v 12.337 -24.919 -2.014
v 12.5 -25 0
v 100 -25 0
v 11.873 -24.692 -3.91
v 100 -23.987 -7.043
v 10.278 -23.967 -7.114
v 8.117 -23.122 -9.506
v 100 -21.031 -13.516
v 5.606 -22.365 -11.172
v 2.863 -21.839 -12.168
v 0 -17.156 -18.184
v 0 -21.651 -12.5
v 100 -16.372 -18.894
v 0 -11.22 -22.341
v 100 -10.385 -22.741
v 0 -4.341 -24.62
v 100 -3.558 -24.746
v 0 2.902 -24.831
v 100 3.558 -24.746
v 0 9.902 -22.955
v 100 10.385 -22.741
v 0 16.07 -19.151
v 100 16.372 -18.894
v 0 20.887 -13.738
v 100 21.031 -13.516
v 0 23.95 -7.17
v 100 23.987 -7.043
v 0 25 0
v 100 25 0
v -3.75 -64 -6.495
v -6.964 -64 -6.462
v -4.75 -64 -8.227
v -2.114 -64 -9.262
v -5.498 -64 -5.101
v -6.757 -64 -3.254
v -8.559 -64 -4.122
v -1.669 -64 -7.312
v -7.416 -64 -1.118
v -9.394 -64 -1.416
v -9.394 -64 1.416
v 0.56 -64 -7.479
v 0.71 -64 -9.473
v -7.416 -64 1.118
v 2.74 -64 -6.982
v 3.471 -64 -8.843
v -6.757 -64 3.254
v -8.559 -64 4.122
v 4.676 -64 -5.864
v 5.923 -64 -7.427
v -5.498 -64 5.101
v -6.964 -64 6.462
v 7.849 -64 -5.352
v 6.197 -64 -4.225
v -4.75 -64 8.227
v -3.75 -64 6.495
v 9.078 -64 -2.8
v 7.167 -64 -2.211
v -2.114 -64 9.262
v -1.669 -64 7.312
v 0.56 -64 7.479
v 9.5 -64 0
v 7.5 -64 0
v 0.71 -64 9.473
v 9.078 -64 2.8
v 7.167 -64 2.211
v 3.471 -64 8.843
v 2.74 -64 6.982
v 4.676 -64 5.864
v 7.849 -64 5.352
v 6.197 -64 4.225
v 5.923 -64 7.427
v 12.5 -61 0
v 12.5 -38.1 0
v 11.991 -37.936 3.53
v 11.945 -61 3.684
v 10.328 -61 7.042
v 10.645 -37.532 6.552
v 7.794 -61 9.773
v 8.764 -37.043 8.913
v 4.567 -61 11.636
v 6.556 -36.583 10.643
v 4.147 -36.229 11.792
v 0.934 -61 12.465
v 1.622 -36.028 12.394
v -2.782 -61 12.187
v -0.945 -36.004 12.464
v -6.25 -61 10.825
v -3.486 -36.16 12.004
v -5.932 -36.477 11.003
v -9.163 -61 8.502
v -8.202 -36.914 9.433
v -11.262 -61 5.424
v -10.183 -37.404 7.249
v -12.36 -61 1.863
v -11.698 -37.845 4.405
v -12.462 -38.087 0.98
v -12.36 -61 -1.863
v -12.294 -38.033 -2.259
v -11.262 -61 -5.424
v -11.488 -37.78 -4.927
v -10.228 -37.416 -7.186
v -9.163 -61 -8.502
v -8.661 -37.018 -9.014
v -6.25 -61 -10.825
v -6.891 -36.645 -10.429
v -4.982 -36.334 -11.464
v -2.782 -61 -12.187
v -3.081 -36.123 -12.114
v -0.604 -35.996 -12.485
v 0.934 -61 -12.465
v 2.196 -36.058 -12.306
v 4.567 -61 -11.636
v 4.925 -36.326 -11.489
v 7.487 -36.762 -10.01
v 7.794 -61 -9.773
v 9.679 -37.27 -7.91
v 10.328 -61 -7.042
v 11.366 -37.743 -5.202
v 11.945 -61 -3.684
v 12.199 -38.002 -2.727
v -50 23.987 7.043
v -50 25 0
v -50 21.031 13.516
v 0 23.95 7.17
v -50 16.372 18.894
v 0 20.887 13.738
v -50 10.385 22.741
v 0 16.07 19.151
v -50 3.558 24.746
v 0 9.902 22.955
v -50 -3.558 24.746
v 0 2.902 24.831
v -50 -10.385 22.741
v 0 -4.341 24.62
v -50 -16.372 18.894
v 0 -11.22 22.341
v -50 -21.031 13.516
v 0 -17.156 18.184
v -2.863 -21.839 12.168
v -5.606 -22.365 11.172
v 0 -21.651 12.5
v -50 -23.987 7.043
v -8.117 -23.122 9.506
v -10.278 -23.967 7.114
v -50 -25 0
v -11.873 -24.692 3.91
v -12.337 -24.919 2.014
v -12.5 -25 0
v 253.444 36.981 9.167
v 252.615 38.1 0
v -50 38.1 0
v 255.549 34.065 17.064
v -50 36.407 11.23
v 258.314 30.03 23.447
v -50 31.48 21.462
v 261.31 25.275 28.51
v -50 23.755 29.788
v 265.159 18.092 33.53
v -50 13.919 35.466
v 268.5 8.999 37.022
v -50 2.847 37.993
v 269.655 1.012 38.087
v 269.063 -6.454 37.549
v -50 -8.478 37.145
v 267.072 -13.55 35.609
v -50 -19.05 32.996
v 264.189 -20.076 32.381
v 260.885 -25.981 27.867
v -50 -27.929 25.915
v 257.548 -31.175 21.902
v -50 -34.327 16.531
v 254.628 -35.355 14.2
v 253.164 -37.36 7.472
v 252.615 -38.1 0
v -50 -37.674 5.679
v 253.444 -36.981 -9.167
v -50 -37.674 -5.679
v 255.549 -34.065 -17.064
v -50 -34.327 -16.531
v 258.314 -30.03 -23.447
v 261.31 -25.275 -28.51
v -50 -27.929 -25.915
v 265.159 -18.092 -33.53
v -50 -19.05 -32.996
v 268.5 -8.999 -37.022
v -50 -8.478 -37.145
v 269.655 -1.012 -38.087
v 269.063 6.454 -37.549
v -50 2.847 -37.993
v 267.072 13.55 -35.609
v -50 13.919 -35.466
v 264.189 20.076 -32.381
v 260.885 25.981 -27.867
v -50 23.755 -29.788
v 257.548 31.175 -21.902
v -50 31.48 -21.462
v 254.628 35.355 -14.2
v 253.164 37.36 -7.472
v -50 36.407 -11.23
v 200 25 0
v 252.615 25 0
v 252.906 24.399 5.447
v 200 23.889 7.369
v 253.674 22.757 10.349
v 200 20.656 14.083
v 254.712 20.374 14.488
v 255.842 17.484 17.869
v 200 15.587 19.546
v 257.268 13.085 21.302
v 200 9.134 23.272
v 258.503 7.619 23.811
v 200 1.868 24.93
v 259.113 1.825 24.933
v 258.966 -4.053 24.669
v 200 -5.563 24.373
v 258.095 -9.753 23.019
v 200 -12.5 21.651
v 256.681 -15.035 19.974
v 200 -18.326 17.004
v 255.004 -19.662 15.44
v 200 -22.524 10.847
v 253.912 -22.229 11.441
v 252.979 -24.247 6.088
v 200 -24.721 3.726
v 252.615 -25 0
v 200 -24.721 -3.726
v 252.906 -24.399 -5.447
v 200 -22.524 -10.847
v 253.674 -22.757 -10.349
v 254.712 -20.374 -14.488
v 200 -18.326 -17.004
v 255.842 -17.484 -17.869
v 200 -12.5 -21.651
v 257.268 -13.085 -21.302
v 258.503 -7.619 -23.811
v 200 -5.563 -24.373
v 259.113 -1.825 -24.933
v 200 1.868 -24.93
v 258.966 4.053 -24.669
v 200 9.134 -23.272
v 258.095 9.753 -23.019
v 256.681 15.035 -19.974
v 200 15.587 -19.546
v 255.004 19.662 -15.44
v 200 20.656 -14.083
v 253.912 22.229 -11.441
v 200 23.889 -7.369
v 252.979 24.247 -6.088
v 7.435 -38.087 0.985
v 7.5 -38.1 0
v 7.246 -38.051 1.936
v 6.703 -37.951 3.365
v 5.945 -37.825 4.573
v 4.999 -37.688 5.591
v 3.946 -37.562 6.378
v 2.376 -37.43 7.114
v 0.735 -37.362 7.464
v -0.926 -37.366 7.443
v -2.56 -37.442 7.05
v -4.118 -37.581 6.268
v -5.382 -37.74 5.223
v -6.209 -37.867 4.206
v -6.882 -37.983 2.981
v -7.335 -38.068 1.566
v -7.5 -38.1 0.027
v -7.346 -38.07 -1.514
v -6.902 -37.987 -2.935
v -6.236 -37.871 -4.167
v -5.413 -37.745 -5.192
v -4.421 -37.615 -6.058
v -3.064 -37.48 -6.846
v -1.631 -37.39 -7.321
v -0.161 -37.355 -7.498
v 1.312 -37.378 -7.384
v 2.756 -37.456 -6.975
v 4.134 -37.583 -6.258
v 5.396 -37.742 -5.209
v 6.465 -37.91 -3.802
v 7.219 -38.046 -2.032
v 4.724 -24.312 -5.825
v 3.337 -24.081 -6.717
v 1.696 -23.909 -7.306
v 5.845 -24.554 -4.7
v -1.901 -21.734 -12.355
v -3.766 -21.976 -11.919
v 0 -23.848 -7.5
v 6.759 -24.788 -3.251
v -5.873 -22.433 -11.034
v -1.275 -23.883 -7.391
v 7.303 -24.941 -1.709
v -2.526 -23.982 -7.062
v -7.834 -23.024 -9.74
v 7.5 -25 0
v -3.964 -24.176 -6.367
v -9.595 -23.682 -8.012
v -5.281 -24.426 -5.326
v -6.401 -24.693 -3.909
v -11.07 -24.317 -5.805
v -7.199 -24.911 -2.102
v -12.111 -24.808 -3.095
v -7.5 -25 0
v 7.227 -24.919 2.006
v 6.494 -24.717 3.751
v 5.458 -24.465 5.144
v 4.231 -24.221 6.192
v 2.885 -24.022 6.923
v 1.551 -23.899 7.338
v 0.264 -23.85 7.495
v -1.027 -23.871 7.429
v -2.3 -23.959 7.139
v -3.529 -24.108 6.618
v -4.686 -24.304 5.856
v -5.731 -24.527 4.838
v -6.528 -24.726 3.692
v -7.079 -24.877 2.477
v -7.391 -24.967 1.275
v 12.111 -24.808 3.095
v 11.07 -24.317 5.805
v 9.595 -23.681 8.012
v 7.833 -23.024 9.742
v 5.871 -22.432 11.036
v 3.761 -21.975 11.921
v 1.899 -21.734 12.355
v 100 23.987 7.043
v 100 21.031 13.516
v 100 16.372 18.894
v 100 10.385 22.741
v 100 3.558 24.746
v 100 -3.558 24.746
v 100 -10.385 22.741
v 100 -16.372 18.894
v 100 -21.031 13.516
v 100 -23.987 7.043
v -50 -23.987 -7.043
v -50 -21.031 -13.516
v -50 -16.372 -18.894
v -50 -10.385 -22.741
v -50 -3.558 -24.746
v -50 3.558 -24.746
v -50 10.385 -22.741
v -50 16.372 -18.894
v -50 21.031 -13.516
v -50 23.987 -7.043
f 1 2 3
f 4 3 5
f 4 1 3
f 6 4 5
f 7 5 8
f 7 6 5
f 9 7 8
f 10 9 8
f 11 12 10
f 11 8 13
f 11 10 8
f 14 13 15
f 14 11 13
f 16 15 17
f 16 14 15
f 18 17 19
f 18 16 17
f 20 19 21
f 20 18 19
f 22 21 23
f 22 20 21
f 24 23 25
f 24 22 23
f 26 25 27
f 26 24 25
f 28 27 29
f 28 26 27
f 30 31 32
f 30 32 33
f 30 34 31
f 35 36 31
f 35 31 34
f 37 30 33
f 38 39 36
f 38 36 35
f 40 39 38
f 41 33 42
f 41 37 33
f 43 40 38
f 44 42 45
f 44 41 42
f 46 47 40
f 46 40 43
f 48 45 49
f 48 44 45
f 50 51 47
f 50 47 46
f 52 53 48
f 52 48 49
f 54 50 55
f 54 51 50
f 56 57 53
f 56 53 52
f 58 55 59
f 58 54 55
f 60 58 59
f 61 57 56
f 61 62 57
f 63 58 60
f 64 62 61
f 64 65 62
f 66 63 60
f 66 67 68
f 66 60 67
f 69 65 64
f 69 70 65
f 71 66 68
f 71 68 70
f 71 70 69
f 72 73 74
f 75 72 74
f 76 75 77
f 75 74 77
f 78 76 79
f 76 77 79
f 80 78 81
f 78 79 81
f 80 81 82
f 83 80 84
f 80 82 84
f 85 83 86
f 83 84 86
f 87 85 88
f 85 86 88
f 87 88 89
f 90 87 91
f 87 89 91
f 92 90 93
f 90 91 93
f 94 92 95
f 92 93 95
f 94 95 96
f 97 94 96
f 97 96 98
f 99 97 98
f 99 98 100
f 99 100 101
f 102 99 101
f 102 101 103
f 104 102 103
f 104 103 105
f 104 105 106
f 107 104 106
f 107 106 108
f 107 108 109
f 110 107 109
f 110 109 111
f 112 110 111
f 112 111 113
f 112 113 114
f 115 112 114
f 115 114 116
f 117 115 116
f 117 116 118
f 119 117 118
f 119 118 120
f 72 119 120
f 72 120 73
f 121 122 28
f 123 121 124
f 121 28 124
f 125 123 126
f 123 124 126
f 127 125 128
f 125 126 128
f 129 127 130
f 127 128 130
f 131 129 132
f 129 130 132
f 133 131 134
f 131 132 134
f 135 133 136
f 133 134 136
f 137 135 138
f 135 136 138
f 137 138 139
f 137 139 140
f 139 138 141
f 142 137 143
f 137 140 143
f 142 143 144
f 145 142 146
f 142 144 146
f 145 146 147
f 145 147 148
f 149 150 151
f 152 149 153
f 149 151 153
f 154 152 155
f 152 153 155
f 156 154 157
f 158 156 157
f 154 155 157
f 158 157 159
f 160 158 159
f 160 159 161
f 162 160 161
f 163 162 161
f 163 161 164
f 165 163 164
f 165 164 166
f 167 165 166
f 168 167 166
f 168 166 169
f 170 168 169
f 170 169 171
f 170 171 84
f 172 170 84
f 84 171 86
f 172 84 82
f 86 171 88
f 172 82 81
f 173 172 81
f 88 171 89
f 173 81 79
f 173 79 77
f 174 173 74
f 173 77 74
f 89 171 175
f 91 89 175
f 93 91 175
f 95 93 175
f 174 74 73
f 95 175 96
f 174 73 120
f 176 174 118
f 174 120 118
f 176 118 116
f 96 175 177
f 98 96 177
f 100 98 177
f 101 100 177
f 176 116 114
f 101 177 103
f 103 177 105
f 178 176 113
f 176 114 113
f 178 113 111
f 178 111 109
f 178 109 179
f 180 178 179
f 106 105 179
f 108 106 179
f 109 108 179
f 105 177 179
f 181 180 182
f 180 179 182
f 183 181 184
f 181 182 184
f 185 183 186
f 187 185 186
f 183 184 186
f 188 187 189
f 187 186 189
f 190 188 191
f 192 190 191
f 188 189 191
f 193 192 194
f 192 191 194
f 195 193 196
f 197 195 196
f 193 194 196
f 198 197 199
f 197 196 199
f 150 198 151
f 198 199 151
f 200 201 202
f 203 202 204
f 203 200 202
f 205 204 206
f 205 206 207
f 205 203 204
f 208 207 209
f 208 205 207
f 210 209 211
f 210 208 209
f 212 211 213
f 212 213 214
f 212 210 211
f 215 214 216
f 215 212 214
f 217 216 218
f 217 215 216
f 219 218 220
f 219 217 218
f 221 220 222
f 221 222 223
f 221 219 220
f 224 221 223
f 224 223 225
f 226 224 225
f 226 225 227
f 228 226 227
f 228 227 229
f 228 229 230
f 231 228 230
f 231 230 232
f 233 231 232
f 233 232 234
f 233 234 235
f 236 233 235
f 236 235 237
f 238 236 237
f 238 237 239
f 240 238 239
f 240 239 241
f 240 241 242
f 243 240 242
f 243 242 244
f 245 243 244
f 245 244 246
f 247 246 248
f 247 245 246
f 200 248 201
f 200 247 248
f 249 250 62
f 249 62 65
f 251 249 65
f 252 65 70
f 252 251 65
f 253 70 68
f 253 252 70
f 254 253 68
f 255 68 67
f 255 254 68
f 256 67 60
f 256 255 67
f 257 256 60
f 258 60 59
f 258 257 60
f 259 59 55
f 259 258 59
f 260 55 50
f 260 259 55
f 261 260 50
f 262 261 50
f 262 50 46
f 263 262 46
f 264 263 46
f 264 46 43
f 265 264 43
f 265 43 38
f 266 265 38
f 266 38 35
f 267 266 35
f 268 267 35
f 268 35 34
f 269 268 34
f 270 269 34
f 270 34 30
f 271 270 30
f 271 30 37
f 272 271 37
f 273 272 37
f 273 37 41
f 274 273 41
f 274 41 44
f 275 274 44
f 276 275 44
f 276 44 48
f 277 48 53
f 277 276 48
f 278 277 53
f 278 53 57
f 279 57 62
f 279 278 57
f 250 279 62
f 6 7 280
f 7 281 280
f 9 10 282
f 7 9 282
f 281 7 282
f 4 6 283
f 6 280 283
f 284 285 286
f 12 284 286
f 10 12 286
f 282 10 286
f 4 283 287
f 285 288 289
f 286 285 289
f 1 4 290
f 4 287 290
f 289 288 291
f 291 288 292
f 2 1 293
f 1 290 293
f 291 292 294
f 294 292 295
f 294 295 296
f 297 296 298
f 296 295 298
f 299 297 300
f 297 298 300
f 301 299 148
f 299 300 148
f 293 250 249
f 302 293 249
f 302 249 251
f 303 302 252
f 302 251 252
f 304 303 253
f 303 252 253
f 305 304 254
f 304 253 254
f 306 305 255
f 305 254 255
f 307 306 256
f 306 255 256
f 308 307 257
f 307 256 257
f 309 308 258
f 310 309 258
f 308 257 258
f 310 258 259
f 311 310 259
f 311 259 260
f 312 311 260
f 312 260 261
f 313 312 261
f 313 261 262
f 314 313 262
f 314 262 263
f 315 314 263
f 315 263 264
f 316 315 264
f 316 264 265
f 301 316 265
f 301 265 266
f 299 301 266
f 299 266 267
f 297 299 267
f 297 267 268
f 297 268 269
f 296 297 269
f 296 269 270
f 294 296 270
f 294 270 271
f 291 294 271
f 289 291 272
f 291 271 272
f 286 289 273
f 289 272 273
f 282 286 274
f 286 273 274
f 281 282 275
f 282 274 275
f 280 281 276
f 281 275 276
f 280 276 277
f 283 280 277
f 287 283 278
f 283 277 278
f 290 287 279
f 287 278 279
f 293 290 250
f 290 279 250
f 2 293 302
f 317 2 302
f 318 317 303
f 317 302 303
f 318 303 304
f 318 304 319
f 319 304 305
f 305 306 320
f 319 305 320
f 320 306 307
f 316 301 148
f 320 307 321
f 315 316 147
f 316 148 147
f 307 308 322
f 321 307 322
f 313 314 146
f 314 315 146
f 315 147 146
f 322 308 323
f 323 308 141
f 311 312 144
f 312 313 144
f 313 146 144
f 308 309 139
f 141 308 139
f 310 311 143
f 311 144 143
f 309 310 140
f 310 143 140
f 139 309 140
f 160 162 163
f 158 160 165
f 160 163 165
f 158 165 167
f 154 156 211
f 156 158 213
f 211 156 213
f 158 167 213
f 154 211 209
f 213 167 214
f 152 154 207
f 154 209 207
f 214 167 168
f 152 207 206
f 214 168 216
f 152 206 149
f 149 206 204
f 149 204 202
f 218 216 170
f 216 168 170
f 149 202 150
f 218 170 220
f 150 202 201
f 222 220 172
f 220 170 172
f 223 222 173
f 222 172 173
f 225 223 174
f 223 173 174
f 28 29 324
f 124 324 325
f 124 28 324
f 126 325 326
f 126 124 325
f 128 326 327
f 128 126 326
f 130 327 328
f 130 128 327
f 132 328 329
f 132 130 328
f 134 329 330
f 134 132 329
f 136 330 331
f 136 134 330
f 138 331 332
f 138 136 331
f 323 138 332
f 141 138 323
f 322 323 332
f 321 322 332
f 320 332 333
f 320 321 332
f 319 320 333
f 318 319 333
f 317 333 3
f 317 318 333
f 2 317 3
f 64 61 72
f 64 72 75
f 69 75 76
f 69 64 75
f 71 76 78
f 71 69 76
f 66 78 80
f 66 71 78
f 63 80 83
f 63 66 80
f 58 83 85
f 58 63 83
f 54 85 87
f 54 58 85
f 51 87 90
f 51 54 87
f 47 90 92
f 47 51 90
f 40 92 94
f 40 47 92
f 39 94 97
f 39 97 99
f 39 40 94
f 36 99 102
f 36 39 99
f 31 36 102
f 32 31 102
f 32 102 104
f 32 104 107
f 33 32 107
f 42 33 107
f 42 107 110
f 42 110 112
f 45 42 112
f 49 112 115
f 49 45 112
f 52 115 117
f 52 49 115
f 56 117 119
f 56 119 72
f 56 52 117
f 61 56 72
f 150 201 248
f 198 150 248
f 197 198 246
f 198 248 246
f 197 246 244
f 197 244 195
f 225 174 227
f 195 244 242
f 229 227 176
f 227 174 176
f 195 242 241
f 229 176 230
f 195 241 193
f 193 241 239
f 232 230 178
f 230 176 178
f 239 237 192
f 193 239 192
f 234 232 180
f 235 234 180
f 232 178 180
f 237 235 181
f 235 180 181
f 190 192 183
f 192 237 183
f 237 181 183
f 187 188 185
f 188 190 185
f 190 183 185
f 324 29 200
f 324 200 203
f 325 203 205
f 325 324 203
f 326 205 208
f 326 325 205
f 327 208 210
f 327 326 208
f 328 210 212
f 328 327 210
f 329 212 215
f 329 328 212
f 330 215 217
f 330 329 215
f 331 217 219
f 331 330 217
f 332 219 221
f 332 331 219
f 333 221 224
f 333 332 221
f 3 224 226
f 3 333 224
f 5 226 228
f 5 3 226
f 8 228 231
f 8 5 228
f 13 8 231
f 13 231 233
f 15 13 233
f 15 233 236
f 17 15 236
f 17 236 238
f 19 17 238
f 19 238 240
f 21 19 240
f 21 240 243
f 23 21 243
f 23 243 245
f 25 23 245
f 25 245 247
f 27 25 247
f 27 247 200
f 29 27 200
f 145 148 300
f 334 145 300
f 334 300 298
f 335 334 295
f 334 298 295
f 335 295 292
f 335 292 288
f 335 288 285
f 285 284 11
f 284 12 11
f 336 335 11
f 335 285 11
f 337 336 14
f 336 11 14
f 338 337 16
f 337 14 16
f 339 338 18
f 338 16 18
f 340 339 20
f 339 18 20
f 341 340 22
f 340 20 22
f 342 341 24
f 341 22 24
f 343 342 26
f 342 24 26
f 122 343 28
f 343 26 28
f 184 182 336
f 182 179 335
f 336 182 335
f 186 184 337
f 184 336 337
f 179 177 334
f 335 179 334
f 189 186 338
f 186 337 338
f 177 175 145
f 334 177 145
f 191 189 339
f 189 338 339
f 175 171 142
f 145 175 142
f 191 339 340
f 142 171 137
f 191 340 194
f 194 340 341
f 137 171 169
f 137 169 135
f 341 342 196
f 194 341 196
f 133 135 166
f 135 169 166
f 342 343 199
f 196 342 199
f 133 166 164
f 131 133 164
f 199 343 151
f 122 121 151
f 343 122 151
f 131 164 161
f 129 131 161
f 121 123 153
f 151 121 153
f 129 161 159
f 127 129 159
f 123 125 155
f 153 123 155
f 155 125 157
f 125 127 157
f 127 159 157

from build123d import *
from build123d import SkipClean  # not in build123d's __all__

# Parameters (mm, degrees)
F0_R      = 12.5
F0_R_2    = 7.5
F1_DEPTH  = 64
F2_R      = 38.1
F2_R_2    = 25
F3_DEPTH  = 100
F4_DEPTH  = 50
F5_SIZE   = 3
F6_R      = 25
F7_DEPTH  = 200
F8_R      = 7.5
F9_DEPTH  = 50
F10_DEPTH = 100
F11_R     = 7.5
F12_DEPTH = 50
F13_DEPTH = 75


with BuildPart() as f1:
    # F0 (on Front) → F1 (new body)
    with BuildSketch(Plane.XZ):
        Circle(F0_R)
        Circle(F0_R_2, mode=Mode.SUBTRACT)
    extrude(amount=F1_DEPTH)

    # F2 (on Right) → F3 (join)
    with BuildSketch(Plane.YZ):
        Circle(F2_R)
        Circle(F2_R_2, mode=Mode.SUBTRACT)
    extrude(amount=F3_DEPTH)

    # F2 (on Right) → F4 (join)
    with BuildSketch(Plane.YZ):
        Circle(F2_R)
        Circle(F2_R_2, mode=Mode.SUBTRACT)
    extrude(amount=-F4_DEPTH)

    # F5
    f5_edges = [f1.edges().sort_by_distance(p)[0] for p in [
        (-12.5, -64, 0),
    ]]
    chamfer(f5_edges, length=F5_SIZE)

    # F6 (on face) → F7 (cut)
    with BuildSketch(Plane(origin=(-50, 0, 0), x_dir=(0, -1, 0), z_dir=(-1, 0, 0))):
        Circle(F6_R)
    extrude(amount=-F7_DEPTH, mode=Mode.SUBTRACT)

    # F8 (on face) → F9 (cut)
    with BuildSketch(Plane.XZ.offset(64)):
        Circle(F8_R)
    extrude(amount=-F9_DEPTH, mode=Mode.SUBTRACT)

    # F10 (add): a face of the model
    f10_faces = [f1.faces().sort_by_distance(p)[0] for p in [
        (100, -37.0223692655, 0),
    ]]
    with SkipClean():  # cleaning this boolean's faces spoils the solid; the shape is the same uncleaned
        extrude(f10_faces, amount=F10_DEPTH)

    # F11 (on face) → F12 (cut)
    with BuildSketch(Plane.XZ.offset(64)):
        Circle(F11_R)
    with SkipClean():  # cleaning this boolean's faces spoils the solid; the shape is the same uncleaned
        extrude(amount=-F12_DEPTH, mode=Mode.SUBTRACT)

    # F13 (add): a face of the model
    f13_faces = [f1.faces().sort_by_distance(p)[0] for p in [
        (200, -37.0223692655, 0),
    ]]
    extrude(f13_faces, amount=F13_DEPTH)

    # F14 (on Top) → F15 (revolve, cut)
    with BuildSketch(Plane.XY):
        Polygon((280.1408666709, 52.4849742776), (252.6145875454, 51.9348941743), (252.6145875454, -50.6588555872), (280.1408666709, -51.4342445287), align=None)
    with SkipClean():  # cleaning this boolean's faces spoils the solid; the shape is the same uncleaned
        revolve(axis=Axis((303.6976158619, 0.4289562068, 0), (0, -1, 0)), mode=Mode.SUBTRACT)


solid = f1.part
